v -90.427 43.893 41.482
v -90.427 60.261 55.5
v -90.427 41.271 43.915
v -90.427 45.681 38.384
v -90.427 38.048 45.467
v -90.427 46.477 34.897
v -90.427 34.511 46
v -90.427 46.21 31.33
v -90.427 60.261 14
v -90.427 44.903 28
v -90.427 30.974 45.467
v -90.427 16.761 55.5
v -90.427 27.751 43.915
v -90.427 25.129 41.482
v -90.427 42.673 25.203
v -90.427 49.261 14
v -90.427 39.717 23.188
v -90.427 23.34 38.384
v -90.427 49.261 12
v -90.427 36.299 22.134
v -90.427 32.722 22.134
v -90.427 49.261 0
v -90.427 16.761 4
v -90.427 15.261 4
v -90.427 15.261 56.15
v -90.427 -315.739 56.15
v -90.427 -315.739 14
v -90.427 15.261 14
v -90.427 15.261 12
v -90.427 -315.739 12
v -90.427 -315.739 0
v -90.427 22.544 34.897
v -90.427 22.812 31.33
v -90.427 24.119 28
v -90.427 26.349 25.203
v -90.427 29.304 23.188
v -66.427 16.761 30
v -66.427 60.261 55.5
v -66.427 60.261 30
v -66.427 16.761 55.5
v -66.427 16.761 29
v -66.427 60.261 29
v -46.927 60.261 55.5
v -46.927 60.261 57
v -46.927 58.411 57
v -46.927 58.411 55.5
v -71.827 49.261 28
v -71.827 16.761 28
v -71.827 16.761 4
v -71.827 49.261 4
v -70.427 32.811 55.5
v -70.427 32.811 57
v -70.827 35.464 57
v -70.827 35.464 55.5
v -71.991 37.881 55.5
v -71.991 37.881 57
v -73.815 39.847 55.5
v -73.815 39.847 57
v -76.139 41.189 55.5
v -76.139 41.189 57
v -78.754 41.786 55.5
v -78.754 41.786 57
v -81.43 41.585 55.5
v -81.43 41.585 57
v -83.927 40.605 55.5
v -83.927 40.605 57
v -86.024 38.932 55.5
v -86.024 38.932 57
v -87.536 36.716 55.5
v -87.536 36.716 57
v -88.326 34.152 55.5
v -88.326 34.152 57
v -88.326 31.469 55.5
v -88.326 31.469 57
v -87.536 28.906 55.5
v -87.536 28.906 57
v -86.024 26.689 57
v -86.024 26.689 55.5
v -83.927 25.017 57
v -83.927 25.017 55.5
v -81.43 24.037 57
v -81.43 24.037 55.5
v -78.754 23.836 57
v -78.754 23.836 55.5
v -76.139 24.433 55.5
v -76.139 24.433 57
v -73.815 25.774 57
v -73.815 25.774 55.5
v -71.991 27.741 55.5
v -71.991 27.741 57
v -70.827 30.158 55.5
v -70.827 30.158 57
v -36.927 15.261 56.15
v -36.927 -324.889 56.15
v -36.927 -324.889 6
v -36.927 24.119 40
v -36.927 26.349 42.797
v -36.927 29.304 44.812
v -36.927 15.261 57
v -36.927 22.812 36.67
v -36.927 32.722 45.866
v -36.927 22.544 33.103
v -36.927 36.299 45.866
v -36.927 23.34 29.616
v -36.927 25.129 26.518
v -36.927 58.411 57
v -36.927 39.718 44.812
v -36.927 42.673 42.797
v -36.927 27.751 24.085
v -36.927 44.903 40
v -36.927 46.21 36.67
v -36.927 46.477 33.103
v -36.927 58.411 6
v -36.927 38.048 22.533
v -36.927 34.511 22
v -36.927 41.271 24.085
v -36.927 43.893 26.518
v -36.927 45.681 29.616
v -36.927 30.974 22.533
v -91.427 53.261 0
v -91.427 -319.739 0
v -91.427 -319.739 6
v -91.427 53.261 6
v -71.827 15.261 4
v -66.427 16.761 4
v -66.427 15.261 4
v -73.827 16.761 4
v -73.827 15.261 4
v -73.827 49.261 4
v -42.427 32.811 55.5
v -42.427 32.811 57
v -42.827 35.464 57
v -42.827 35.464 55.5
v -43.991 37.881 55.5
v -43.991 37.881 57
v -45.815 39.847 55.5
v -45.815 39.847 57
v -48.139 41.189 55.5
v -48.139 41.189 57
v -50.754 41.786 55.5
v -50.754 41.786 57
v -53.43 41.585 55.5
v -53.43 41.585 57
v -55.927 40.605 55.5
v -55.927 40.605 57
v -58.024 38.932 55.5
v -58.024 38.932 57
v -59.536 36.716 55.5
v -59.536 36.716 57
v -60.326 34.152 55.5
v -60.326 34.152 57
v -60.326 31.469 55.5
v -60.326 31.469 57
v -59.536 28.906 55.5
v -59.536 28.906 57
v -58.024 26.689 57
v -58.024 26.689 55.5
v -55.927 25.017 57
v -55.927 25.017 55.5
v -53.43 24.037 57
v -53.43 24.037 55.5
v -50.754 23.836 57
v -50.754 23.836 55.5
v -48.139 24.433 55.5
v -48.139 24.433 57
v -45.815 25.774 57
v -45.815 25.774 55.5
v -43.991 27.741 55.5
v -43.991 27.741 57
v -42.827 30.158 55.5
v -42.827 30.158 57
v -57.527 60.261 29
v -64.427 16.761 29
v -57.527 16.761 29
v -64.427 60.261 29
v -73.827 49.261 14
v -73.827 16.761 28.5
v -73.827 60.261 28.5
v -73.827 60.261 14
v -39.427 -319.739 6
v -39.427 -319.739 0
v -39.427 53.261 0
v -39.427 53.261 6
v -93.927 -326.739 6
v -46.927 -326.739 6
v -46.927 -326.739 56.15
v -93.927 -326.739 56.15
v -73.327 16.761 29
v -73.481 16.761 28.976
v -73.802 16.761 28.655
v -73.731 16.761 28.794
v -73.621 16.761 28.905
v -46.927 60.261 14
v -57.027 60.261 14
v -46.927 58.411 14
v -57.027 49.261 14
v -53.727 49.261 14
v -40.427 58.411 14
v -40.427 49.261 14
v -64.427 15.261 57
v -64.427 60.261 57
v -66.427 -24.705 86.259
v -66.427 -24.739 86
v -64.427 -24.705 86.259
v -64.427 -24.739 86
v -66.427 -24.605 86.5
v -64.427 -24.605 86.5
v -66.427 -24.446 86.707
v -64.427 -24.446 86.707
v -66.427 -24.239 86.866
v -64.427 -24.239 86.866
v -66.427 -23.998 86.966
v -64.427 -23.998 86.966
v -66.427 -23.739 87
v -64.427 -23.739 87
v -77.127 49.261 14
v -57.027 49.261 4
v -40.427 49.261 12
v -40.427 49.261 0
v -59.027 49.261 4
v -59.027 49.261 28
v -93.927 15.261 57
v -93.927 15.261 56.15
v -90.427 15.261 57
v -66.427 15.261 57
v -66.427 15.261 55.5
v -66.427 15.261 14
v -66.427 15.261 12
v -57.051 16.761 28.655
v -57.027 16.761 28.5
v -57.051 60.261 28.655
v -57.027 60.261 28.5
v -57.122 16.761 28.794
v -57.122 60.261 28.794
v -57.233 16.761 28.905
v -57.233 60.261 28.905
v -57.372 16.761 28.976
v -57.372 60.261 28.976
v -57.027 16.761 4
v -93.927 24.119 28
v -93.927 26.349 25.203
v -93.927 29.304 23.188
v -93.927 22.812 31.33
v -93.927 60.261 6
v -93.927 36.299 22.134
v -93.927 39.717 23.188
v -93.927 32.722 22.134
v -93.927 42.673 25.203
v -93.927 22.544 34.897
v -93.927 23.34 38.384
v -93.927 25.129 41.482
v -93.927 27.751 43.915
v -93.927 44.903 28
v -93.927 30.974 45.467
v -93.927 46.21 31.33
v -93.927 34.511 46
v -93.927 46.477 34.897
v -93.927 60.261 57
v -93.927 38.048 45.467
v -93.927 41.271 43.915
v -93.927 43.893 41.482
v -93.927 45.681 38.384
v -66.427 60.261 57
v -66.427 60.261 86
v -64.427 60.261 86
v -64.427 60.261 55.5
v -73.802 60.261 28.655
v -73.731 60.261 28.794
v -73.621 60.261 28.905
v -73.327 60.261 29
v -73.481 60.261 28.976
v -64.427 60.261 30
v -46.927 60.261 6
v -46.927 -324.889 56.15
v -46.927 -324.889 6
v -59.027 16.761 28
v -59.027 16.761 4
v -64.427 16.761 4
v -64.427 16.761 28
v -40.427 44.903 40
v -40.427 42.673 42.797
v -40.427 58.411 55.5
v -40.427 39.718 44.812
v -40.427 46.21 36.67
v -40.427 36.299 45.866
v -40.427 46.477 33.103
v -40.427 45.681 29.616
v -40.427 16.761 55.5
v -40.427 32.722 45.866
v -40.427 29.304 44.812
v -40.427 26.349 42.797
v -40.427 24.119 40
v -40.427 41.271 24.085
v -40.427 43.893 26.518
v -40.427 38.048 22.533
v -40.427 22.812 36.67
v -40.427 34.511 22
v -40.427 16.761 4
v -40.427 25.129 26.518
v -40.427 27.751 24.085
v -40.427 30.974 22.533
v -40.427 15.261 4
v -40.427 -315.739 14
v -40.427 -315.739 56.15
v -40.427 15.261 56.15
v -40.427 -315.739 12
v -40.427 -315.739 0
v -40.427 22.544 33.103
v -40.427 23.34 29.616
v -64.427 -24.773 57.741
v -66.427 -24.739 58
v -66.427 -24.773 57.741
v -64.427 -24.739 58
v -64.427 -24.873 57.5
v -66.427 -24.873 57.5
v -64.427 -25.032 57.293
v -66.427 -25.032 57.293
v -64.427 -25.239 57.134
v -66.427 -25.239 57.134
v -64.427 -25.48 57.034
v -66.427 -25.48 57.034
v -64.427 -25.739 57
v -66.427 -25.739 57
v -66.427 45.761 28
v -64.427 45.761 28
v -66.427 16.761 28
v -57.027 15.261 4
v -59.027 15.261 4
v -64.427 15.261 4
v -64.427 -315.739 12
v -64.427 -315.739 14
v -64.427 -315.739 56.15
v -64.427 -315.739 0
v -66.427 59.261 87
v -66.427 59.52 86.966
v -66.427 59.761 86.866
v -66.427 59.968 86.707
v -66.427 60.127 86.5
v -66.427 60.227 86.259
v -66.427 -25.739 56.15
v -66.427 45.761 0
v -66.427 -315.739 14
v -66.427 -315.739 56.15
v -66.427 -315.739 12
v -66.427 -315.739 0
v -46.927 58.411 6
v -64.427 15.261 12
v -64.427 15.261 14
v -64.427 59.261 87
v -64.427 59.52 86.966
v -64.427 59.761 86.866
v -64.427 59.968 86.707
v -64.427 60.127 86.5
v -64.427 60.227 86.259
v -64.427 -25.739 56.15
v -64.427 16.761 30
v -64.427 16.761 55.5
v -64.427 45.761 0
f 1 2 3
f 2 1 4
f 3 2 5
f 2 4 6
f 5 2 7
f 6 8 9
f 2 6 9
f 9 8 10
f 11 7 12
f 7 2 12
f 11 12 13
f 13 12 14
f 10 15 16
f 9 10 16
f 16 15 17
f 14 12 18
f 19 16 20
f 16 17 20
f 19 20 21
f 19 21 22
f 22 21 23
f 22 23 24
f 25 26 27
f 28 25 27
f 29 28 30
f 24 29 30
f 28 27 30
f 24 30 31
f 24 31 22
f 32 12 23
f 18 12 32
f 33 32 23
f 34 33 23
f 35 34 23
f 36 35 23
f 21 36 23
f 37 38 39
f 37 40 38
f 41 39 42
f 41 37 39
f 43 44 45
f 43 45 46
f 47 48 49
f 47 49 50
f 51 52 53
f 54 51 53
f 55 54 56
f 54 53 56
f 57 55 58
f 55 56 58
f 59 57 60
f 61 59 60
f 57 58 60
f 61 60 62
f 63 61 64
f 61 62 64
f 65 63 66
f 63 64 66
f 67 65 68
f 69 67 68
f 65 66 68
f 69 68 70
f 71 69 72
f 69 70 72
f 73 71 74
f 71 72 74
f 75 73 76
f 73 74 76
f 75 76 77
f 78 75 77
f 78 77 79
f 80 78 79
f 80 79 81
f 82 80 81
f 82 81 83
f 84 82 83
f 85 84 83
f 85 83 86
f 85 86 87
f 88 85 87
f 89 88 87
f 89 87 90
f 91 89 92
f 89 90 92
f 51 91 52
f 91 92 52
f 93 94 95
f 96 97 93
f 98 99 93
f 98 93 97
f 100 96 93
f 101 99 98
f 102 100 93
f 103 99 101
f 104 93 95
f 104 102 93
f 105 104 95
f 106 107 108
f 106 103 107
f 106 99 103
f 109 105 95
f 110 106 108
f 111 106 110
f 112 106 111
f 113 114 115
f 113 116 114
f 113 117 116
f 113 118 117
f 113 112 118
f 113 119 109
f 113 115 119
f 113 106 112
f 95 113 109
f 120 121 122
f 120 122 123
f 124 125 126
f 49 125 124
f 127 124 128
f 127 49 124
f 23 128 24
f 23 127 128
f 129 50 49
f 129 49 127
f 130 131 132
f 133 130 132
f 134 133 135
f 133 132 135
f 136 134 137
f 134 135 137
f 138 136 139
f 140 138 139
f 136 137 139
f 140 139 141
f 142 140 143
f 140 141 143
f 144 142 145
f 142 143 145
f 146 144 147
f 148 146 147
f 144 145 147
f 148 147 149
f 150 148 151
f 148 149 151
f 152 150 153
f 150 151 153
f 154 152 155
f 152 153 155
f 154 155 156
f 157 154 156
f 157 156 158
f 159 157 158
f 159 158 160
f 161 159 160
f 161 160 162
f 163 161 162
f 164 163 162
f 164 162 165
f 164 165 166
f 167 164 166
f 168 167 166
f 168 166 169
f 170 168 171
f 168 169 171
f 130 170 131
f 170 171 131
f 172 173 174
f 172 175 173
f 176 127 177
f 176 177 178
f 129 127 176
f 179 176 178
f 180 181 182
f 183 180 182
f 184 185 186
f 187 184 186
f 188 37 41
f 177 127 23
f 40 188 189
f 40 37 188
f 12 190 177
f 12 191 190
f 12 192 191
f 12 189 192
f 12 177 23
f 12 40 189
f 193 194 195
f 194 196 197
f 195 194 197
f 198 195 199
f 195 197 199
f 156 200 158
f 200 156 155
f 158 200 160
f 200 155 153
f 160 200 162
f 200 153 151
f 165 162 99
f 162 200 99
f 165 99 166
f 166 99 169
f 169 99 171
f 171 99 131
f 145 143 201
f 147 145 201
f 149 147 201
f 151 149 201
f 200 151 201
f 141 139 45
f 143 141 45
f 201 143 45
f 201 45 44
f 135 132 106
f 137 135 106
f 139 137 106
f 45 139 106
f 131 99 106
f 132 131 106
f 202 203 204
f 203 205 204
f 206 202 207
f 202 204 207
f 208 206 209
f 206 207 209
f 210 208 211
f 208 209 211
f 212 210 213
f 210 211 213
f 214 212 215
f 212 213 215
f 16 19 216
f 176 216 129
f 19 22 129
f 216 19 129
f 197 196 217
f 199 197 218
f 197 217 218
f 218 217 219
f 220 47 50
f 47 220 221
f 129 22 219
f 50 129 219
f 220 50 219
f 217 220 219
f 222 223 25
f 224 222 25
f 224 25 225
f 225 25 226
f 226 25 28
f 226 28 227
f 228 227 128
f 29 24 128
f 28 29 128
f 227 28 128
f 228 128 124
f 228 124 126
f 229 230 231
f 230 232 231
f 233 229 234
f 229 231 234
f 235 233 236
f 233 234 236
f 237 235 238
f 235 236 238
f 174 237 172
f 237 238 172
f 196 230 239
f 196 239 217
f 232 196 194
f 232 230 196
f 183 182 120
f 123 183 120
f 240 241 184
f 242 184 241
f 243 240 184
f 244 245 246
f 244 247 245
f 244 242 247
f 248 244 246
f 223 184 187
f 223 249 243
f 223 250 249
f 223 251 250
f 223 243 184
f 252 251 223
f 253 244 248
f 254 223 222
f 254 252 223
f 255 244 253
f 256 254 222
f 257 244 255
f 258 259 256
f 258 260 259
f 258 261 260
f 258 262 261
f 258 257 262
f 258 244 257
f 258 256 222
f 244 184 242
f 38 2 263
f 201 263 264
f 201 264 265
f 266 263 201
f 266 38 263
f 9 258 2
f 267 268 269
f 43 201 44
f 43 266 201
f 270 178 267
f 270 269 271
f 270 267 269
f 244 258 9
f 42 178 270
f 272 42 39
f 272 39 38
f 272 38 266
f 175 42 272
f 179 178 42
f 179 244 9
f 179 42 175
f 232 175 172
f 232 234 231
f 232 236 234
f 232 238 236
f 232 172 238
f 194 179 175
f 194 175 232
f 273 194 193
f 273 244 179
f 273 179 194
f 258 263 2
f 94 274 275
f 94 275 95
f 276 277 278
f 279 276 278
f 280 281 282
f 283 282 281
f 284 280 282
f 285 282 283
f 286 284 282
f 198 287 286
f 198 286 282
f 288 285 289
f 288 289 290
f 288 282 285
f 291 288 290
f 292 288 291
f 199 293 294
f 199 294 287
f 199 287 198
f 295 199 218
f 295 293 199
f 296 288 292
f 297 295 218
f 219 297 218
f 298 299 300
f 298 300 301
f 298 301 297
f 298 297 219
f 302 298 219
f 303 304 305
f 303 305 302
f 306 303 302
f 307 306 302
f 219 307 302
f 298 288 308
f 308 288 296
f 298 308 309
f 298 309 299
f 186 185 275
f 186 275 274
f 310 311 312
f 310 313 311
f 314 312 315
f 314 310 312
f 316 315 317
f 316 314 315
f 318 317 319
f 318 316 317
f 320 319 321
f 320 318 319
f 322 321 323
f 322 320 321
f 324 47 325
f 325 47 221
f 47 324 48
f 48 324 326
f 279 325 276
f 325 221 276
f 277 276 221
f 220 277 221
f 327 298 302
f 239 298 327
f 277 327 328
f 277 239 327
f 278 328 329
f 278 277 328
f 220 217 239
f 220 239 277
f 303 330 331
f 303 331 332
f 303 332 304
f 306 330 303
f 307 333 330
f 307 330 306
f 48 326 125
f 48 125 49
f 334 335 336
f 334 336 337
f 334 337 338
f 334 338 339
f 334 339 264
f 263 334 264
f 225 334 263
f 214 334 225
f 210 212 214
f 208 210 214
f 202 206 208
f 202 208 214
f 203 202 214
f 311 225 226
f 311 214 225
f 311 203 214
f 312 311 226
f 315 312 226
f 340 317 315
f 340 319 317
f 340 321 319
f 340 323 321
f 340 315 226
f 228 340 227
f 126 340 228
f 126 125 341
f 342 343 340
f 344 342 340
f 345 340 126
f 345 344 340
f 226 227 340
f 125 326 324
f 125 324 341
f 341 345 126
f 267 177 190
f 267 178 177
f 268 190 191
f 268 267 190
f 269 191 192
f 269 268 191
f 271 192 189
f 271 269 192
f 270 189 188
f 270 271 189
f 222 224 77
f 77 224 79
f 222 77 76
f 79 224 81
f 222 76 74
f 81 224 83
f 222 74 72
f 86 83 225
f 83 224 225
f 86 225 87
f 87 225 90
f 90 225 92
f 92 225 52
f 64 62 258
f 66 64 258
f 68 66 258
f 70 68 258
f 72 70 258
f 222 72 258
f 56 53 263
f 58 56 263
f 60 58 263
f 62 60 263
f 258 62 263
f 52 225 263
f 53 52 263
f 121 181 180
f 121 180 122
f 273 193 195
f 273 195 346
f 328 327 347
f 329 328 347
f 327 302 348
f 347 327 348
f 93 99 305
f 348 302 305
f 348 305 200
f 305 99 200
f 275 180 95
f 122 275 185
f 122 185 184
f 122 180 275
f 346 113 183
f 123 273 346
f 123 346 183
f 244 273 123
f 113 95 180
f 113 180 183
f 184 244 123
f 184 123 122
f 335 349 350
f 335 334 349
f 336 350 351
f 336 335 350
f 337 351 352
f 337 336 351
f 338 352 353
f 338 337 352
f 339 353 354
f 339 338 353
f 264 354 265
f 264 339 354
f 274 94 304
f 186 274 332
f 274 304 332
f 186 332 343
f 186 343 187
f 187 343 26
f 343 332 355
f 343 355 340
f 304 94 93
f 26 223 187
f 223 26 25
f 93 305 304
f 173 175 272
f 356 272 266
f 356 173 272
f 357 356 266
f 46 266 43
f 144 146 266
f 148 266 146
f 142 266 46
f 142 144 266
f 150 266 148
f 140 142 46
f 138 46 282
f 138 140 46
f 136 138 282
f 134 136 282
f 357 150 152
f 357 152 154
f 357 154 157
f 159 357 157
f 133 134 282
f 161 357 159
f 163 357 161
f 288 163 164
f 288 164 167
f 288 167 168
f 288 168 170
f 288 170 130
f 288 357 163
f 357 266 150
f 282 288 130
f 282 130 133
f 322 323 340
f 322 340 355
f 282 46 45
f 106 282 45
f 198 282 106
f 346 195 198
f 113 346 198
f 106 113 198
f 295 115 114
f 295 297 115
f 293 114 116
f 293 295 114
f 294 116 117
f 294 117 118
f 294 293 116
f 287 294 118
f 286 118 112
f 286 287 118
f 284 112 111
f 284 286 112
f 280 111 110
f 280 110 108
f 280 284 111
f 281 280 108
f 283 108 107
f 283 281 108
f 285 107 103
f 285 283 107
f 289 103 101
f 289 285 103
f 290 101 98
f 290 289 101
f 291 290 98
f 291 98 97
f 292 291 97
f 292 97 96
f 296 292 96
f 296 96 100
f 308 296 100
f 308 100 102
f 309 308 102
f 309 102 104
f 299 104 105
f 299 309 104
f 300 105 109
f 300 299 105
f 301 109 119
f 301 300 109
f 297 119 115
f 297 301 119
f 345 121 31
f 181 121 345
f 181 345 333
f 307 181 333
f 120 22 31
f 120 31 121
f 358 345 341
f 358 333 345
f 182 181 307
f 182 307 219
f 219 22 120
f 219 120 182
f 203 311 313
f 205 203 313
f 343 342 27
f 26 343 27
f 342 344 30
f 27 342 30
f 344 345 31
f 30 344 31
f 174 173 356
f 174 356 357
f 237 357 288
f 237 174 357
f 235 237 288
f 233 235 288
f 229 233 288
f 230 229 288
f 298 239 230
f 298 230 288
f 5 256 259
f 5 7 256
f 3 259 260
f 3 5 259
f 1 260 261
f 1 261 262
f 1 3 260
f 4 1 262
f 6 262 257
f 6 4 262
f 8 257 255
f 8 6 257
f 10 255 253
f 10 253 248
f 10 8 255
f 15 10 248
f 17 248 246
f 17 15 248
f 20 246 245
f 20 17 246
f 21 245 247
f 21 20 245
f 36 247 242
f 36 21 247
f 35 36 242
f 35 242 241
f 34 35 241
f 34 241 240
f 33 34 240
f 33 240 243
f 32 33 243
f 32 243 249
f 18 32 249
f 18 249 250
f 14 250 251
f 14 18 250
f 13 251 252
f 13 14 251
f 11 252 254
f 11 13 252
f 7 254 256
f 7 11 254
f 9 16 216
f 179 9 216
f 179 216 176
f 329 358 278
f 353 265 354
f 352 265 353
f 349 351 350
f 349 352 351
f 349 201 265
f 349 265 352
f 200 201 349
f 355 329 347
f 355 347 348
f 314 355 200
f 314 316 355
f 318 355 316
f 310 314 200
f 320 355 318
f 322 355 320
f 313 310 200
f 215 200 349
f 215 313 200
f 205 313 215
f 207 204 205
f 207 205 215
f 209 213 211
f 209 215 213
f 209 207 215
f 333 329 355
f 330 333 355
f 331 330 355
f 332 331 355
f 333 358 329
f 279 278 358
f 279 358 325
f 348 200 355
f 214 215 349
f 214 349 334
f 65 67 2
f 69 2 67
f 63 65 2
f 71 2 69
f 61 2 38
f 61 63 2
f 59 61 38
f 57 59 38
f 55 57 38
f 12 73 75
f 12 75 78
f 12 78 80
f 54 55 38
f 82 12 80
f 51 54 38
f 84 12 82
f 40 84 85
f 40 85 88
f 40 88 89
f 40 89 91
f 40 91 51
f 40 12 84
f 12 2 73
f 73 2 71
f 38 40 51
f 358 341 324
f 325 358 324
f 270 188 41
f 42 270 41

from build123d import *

# Parameters (mm, degrees)
SZKIC1_W                     = 53
SZKIC1_H                     = 374
SZKIC1_W_2                   = 24
SZKIC1_H_2                   = 365
DODANIE_WYCI_GNI_CIE2_DEPTH  = 12
SZKIC2_W                     = 12
SZKIC2_H                     = 3.5
WYTNIJ_WYCI_GNI_CIE1_DEPTH   = 2
SZKIC3_W                     = 53
SZKIC3_H                     = 374
DODANIE_WYCI_GNI_CIE3_DEPTH  = 2
SZKIC4_W                     = 13.3
SZKIC4_H                     = 30.500081729
SZKIC4_W_2                   = 9.4
SZKIC4_H_2                   = 64.96
WYTNIJ_WYCI_GNI_CIE2_DEPTH   = 2
SZKIC5_W                     = 2
SZKIC5_H                     = 374
DODANIE_WYCI_GNI_CIE4_DEPTH  = 43
DODANIE_WYCI_GNI_CIE5_DEPTH  = 41.5
SZKIC7_W                     = 25.5
SZKIC7_H                     = 38.500081729
DODANIE_WYCI_GNI_CIE6_DEPTH  = 1.5
SZKIC9_R                     = 12
WYTNIJ_WYCI_GNI_CIE4_DEPTH   = 1.5
DODANIE_WYCI_GNI_CIE7_DEPTH  = 43
DODANIE_WYCI_GNI_CIE8_DEPTH  = 43
SZKIC12_R                    = 12
WYTNIJ_WYCI_GNI_CIE5_DEPTH   = 1.5
SZKIC13_R                    = 9
WYTNIJ_WYCI_GNI_CIE6_DEPTH   = 1.5
SZKIC14_W                    = 57
SZKIC14_H                    = 374
SZKIC14_R                    = 12
DODANIE_WYCI_GNI_CIE9_DEPTH  = 1
SZKIC15_W                    = 57
SZKIC15_H                    = 374
SZKIC15_R                    = 12
DODANIE_WYCI_GNI_CIE10_DEPTH = 1
SZKIC16_W                    = 55
SZKIC16_H                    = 57
SZKIC16_W_2                  = 24
SZKIC16_H_2                  = 41.5
DODANIE_WYCI_GNI_CIE11_DEPTH = 1
SZKIC17_W                    = 55
SZKIC17_H                    = 57
DODANIE_WYCI_GNI_CIE12_DEPTH = 1
DODANIE_WYCI_GNI_CIE13_DEPTH = 30
SZKIC20_W                    = 55
SZKIC20_H                    = 57
DODANIE_WYCI_GNI_CIE14_DEPTH = 5.5
SZKIC21_W                    = 24
SZKIC21_H                    = 41.5
DODANIE_WYCI_GNI_CIE15_DEPTH = 5.5
SZKIC22_W                    = 57
SZKIC22_H                    = 387
SZKIC22_R                    = 12
DODANIE_WYCI_GNI_CIE16_DEPTH = 1
SZKIC23_W                    = 57
SZKIC23_H                    = 387
SZKIC23_R                    = 12
DODANIE_WYCI_GNI_CIE17_DEPTH = 1
ZAOKR_GLENIE1_R              = 1
ZAOKR_GLENIE2_R              = 1
ZAOKR_GLENIE3_R              = 1
SZKIC24_W                    = 57
SZKIC24_H                    = 387
SZKIC24_W_2                  = 52
SZKIC24_H_2                  = 373
WYTNIJ_WYCI_GNI_CIE7_DEPTH   = 6
SZKIC25_W                    = 24
SZKIC25_H                    = 330.999918271
WYTNIJ_WYCI_GNI_CIE8_DEPTH   = 2
SZKIC26_W                    = 10
SZKIC26_H                    = 51
WYTNIJ_WYCI_GNI_CIE9_DEPTH   = 1.85
SZKIC27_W                    = 10
SZKIC27_H                    = 51
WYTNIJ_WYCI_GNI_CIE10_DEPTH  = 1.85
WYTNIJ_WYCI_GNI_CIE11_DEPTH  = 0.85
WYTNIJ_WYCI_GNI_CIE12_DEPTH  = 2
WYTNIJ_WYCI_GNI_CIE13_DEPTH  = 2
SZKIC31_W                    = 2
SZKIC31_H                    = 3.5
WYTNIJ_WYCI_GNI_CIE14_DEPTH  = 16
DODANIE_WYCI_GNI_CIE18_DEPTH = 7.4
DODANIE_WYCI_GNI_CIE19_DEPTH = 7.4
SZKIC34_W                    = 7.4
SZKIC34_H                    = 11
DODANIE_WYCI_GNI_CIE20_DEPTH = 14
SZKIC35_W                    = 7.4
SZKIC35_H                    = 11
DODANIE_WYCI_GNI_CIE21_DEPTH = 14
SZKIC36_W                    = 2
SZKIC36_H                    = 34.000081729
DODANIE_WYCI_GNI_CIE22_DEPTH = 24
SZKIC37_W                    = 16.6
SZKIC37_H                    = 1.5
SZKIC37_W_2                  = 5.4
DODANIE_WYCI_GNI_CIE23_DEPTH = 8
SZKIC38_W                    = 7.4
SZKIC38_H                    = 43.500081729
WYTNIJ_WYCI_GNI_CIE15_DEPTH  = 1
ZAOKR_GLENIE4_R              = 0.5
ZAOKR_GLENIE5_R              = 0.5


with BuildPart() as part:
    # Szkic1 → Dodanie-wyciągnięcie2 (new body)
    with BuildSketch(Plane.XY):
        with Locations((-65.426891924, -133.239080048)):
            Rectangle(SZKIC1_W, SZKIC1_H)
        with Locations((-78.426891924, -133.239080048)):
            Rectangle(SZKIC1_W_2, SZKIC1_H_2, mode=Mode.SUBTRACT)
        with Locations((-52.426891924, -133.239080048)):
            Rectangle(SZKIC1_W_2, SZKIC1_H_2, mode=Mode.SUBTRACT)
    extrude(amount=DODANIE_WYCI_GNI_CIE2_DEPTH)

    # Szkic2 → Wytnij-wyciągnięcie1 (cut)
    with BuildSketch(Plane.ZY.offset(66.426891924)):
        with Locations((6, 47.510919952)):
            Rectangle(SZKIC2_W, SZKIC2_H)
    extrude(amount=-WYTNIJ_WYCI_GNI_CIE1_DEPTH, mode=Mode.SUBTRACT)

    # Szkic3 → Dodanie-wyciągnięcie3 (add)
    with BuildSketch(Plane.XY.offset(12)):
        with Locations((-65.426891924, -133.239080048)):
            Rectangle(SZKIC3_W, SZKIC3_H)
    extrude(amount=DODANIE_WYCI_GNI_CIE3_DEPTH)

    # Szkic4 → Wytnij-wyciągnięcie2 (cut)
    with BuildSketch(Plane.XY.offset(14)):
        Polygon((-46.926891924, -11.039080048), (-56.326891924, -11.039080048), (-56.326891924, -35.399080048), (-56.326891924, -40.479080048), (-46.926891924, -40.479080048), (-46.926891924, -35.399080048), align=None)
        with Locations((-47.076891924, 34.010879088)):
            Rectangle(SZKIC4_W, SZKIC4_H)
        with Locations((-83.776891924, 34.010879088)):
            Rectangle(SZKIC4_W, SZKIC4_H)
        Polygon((-74.526891924, -35.399080048), (-74.526891924, -11.039080048), (-83.926891924, -11.039080048), (-83.926891924, -35.399080048), (-83.926891924, -40.479080048), (-74.526891924, -40.479080048), align=None)
        with Locations((-51.626891924, -133.719080048)):
            Rectangle(SZKIC4_W_2, SZKIC4_H_2)
        with Locations((-79.226891924, -133.719080048)):
            Rectangle(SZKIC4_W_2, SZKIC4_H_2)
    extrude(amount=-WYTNIJ_WYCI_GNI_CIE2_DEPTH, mode=Mode.SUBTRACT)

    # Szkic5 → Dodanie-wyciągnięcie4 (add)
    with BuildSketch(Plane.XY.offset(14)):
        with Locations((-65.426891924, -133.239080048)):
            Rectangle(SZKIC5_W, SZKIC5_H)
    extrude(amount=DODANIE_WYCI_GNI_CIE4_DEPTH)

    # Szkic6 → Dodanie-wyciągnięcie5 (add)
    with BuildSketch(Plane.XY.offset(14)):
        Polygon((-64.426891924, 16.760838223), (-40.426891924, 16.760838223), (-40.426891924, 53.760919952), (-38.926891924, 53.760919952), (-38.926891924, 15.260838223), (-64.426891924, 15.260838223), align=None)
        Polygon((-90.426891924, 53.760919952), (-91.926891924, 53.760919952), (-91.926891924, 15.260838223), (-66.426891924, 15.260838223), (-66.426891924, 16.760838223), (-90.426891924, 16.760838223), align=None)
    extrude(amount=DODANIE_WYCI_GNI_CIE5_DEPTH)

    # Szkic7 → Dodanie-wyciągnięcie6 (add)
    with BuildSketch(Plane.XY.offset(55.5)):
        with Locations((-51.676891924, 34.510879088)):
            Rectangle(SZKIC7_W, SZKIC7_H)
        with Locations((-79.176891924, 34.510879088)):
            Rectangle(SZKIC7_W, SZKIC7_H)
    extrude(amount=DODANIE_WYCI_GNI_CIE6_DEPTH)

    # Szkic9 → Wytnij-wyciągnięcie4 (cut)
    with BuildSketch(Plane.ZY.offset(91.926891924)):
        with Locations((34, 34.510879088)):
            Circle(SZKIC9_R)
    extrude(amount=-WYTNIJ_WYCI_GNI_CIE4_DEPTH, mode=Mode.SUBTRACT)

    # Szkic10 → Dodanie-wyciągnięcie7 (add)
    with BuildSketch(Plane.XY.offset(14)):
        Polygon((-91.926891924, 15.260838223), (-91.926891924, -320.239080048), (-66.426891924, -320.239080048), (-66.426891924, -315.739080048), (-90.426891924, -315.739080048), (-90.426891924, 15.260838223), align=None)
    extrude(amount=DODANIE_WYCI_GNI_CIE7_DEPTH)

    # Szkic11 → Dodanie-wyciągnięcie8 (add)
    with BuildSketch(Plane.XY.offset(14)):
        Polygon((-38.926891924, 15.260838223), (-38.926891924, -320.239080048), (-64.426891924, -320.239080048), (-64.426891924, -315.739080048), (-40.426891924, -315.739080048), (-40.426891924, 15.260838223), align=None)
    extrude(amount=DODANIE_WYCI_GNI_CIE8_DEPTH)

    # Szkic12 → Wytnij-wyciągnięcie5 (cut)
    with BuildSketch(Plane(origin=(-38.926891924, 0, 0), x_dir=(0, 0, -1), z_dir=(1, 0, 0))):
        with Locations((-34, 34.510919952)):
            Circle(SZKIC12_R)
    extrude(amount=-WYTNIJ_WYCI_GNI_CIE5_DEPTH, mode=Mode.SUBTRACT)

    # Szkic13 → Wytnij-wyciągnięcie6 (cut)
    with BuildSketch(Plane.XY.offset(57)):
        with Locations((-51.426891924, 32.810879088)):
            Circle(SZKIC13_R)
        with Locations((-79.426891924, 32.810879088)):
            Circle(SZKIC13_R)
    extrude(amount=-WYTNIJ_WYCI_GNI_CIE6_DEPTH, mode=Mode.SUBTRACT)

    # Szkic14 → Dodanie-wyciągnięcie9 (add)
    with BuildSketch(Plane(origin=(-38.926891924, 0, 0), x_dir=(0, 0, -1), z_dir=(1, 0, 0))):
        with Locations((-28.5, -133.239080048)):
            Rectangle(SZKIC14_W, SZKIC14_H)
        with Locations((-34, 34.510919952)):
            Circle(SZKIC14_R, mode=Mode.SUBTRACT)
    extrude(amount=DODANIE_WYCI_GNI_CIE9_DEPTH)

    # Szkic15 → Dodanie-wyciągnięcie10 (add)
    with BuildSketch(Plane.ZY.offset(91.926891924)):
        with Locations((28.5, -133.239080048)):
            Rectangle(SZKIC15_W, SZKIC15_H)
        with Locations((34, 34.510879088)):
            Circle(SZKIC15_R, mode=Mode.SUBTRACT)
    extrude(amount=DODANIE_WYCI_GNI_CIE10_DEPTH)

    # Szkic16 → Dodanie-wyciągnięcie11 (add)
    with BuildSketch(Plane(origin=(0, 53.760919952, 0), x_dir=(1, 0, 0), z_dir=(0, 1, 0))):
        with Locations((-65.426891924, -28.5)):
            Rectangle(SZKIC16_W, SZKIC16_H)
        with Locations((-52.426891924, -34.75)):
            Rectangle(SZKIC16_W_2, SZKIC16_H_2, mode=Mode.SUBTRACT)
        with Locations((-78.426891924, -34.75)):
            Rectangle(SZKIC16_W_2, SZKIC16_H_2, mode=Mode.SUBTRACT)
    extrude(amount=DODANIE_WYCI_GNI_CIE11_DEPTH)

    # Szkic17 → Dodanie-wyciągnięcie12 (add)
    with BuildSketch(Plane.XZ.offset(320.239080048)):
        with Locations((-65.426891924, 28.5)):
            Rectangle(SZKIC17_W, SZKIC17_H)
    extrude(amount=DODANIE_WYCI_GNI_CIE12_DEPTH)

    # Szkic18 → Dodanie-wyciągnięcie13 (add)
    with BuildSketch(Plane.XY.offset(57)):
        Polygon((-64.426891924, 15.260838223), (-64.426891924, 54.760919952), (-66.426891924, 54.760919952), (-66.426891924, 15.260838223), (-66.426891924, -4.739161777), (-66.426891924, -24.739161777), (-64.426891924, -24.739161777), (-64.426891924, -4.739161777), align=None)
    extrude(amount=DODANIE_WYCI_GNI_CIE13_DEPTH)

    # Szkic20 → Dodanie-wyciągnięcie14 (add)
    with BuildSketch(Plane.XZ.offset(321.239080048)):
        with Locations((-65.426891924, 28.5)):
            Rectangle(SZKIC20_W, SZKIC20_H)
    extrude(amount=DODANIE_WYCI_GNI_CIE14_DEPTH)

    # Szkic21 → Dodanie-wyciągnięcie15 (add)
    with BuildSketch(Plane(origin=(0, 54.760919952, 0), x_dir=(1, 0, 0), z_dir=(0, 1, 0))):
        Polygon((-64.426891924, -87), (-66.426891924, -87), (-66.426891924, -57), (-92.926891924, -57), (-92.926891924, 0), (-37.926891924, 0), (-37.926891924, -57), (-64.426891924, -57), align=None)
        with Locations((-52.426891924, -34.75)):
            Rectangle(SZKIC21_W, SZKIC21_H, mode=Mode.SUBTRACT)
        with Locations((-78.426891924, -34.75)):
            Rectangle(SZKIC21_W, SZKIC21_H, mode=Mode.SUBTRACT)
    extrude(amount=DODANIE_WYCI_GNI_CIE15_DEPTH)

    # Szkic22 → Dodanie-wyciągnięcie16 (add)
    with BuildSketch(Plane(origin=(-37.926891924, 0, 0), x_dir=(0, 0, -1), z_dir=(1, 0, 0))):
        with Locations((-28.5, -133.239080048)):
            Rectangle(SZKIC22_W, SZKIC22_H)
        with Locations((-34, 34.510919952)):
            Circle(SZKIC22_R, mode=Mode.SUBTRACT)
    extrude(amount=DODANIE_WYCI_GNI_CIE16_DEPTH)

    # Szkic23 → Dodanie-wyciągnięcie17 (add)
    with BuildSketch(Plane.ZY.offset(92.926891924)):
        with Locations((28.5, -133.239080048)):
            Rectangle(SZKIC23_W, SZKIC23_H)
        with Locations((34, 34.510879088)):
            Circle(SZKIC23_R, mode=Mode.SUBTRACT)
    extrude(amount=DODANIE_WYCI_GNI_CIE17_DEPTH)

    # Zaokrąglenie1
    zaokr_glenie1_edges = [part.edges().sort_by_distance(p)[0] for p in [
        (-65.426891924, -24.739161777, 87),
    ]]
    fillet(zaokr_glenie1_edges, radius=ZAOKR_GLENIE1_R)

    # Zaokrąglenie2
    zaokr_glenie2_edges = [part.edges().sort_by_distance(p)[0] for p in [
        (-65.426891924, -24.739161777, 57),
    ]]
    fillet(zaokr_glenie2_edges, radius=ZAOKR_GLENIE2_R)

    # Zaokrąglenie3
    zaokr_glenie3_edges = [part.edges().sort_by_distance(p)[0] for p in [
        (-65.426891924, 60.260919952, 87),
    ]]
    fillet(zaokr_glenie3_edges, radius=ZAOKR_GLENIE3_R)

    # Szkic24 → Wytnij-wyciągnięcie7 (cut)
    with BuildSketch(Plane(origin=(0, 0, 0), x_dir=(-1, 0, 0), z_dir=(0, 0, -1))):
        with Locations((65.426891924, -133.239080048)):
            Rectangle(SZKIC24_W, SZKIC24_H)
        with Locations((65.426891924, -133.239080048)):
            Rectangle(SZKIC24_W_2, SZKIC24_H_2, mode=Mode.SUBTRACT)
    extrude(amount=-WYTNIJ_WYCI_GNI_CIE7_DEPTH, mode=Mode.SUBTRACT)

    # Szkic25 → Wytnij-wyciągnięcie8 (cut)
    with BuildSketch(Plane.XY.offset(14)):
        with Locations((-52.426891924, -150.239120912)):
            Rectangle(SZKIC25_W, SZKIC25_H)
        with Locations((-78.426891924, -150.239120912)):
            Rectangle(SZKIC25_W, SZKIC25_H)
    extrude(amount=-WYTNIJ_WYCI_GNI_CIE8_DEPTH, mode=Mode.SUBTRACT)

    # Szkic26 → Wytnij-wyciągnięcie9 (cut)
    with BuildSketch(Plane(origin=(0, 60.260919952, 0), x_dir=(1, 0, 0), z_dir=(0, 1, 0))):
        with Locations((-41.926891924, -31.5)):
            Rectangle(SZKIC26_W, SZKIC26_H)
    extrude(amount=-WYTNIJ_WYCI_GNI_CIE9_DEPTH, mode=Mode.SUBTRACT)

    # Szkic27 → Wytnij-wyciągnięcie10 (cut)
    with BuildSketch(Plane.XZ.offset(326.739080048)):
        with Locations((-41.926891924, 31.5)):
            Rectangle(SZKIC27_W, SZKIC27_H)
    extrude(amount=-WYTNIJ_WYCI_GNI_CIE10_DEPTH, mode=Mode.SUBTRACT)

    # Szkic28 → Wytnij-wyciągnięcie11 (cut)
    with BuildSketch(Plane.XY.offset(57)):
        Polygon((-36.926891924, -324.889080048), (-46.926891924, -324.889080048), (-46.926891924, -326.739080048), (-93.926891924, -326.739080048), (-93.926891924, 15.260838223), (-66.426891924, 15.260838223), (-66.426891924, -25.739161777), (-64.426891924, -25.739161777), (-64.426891924, 15.260838223), (-36.926891924, 15.260838223), align=None)
    extrude(amount=-WYTNIJ_WYCI_GNI_CIE11_DEPTH, mode=Mode.SUBTRACT)

    # Szkic29 → Wytnij-wyciągnięcie12 (cut)
    with BuildSketch(Plane.XY.offset(14)):
        Polygon((-40.426891924, 18.760838223), (-40.426891924, 16.760838223), (-64.426891924, 16.760838223), (-64.426891924, 49.260919952), (-53.726891924, 49.260919952), (-53.726891924, 18.760838223), align=None)
    extrude(amount=-WYTNIJ_WYCI_GNI_CIE12_DEPTH, mode=Mode.SUBTRACT)

    # Szkic30 → Wytnij-wyciągnięcie13 (cut)
    with BuildSketch(Plane.XY.offset(14)):
        Polygon((-77.126891924, 49.260919952), (-66.426891924, 49.260919952), (-66.426891924, 16.760838223), (-90.426891924, 16.760838223), (-90.426891924, 18.760838223), (-77.126891924, 18.760838223), align=None)
    extrude(amount=-WYTNIJ_WYCI_GNI_CIE13_DEPTH, mode=Mode.SUBTRACT)

    # Szkic31 → Wytnij-wyciągnięcie14 (cut)
    with BuildSketch(Plane(origin=(0, 0, 12), x_dir=(-1, 0, 0), z_dir=(0, 0, -1))):
        with Locations((65.426891924, 47.510919952)):
            Rectangle(SZKIC31_W, SZKIC31_H)
    extrude(amount=-WYTNIJ_WYCI_GNI_CIE14_DEPTH, mode=Mode.SUBTRACT)

    # Szkic32 → Dodanie-wyciągnięcie18 (add)
    with BuildSketch(Plane(origin=(-64.426891924, 0, 0), x_dir=(0, 0, -1), z_dir=(1, 0, 0))):
        Polygon((-28, 45.760919952), (-28, 16.760838223), (-30, 16.760838223), (-30, 60.260919952), (-28, 60.260919952), align=None)
    extrude(amount=DODANIE_WYCI_GNI_CIE18_DEPTH)

    # Szkic33 → Dodanie-wyciągnięcie19 (add)
    with BuildSketch(Plane.ZY.offset(66.426891924)):
        Polygon((28, 49.260919952), (28, 60.260919952), (30, 60.260919952), (30, 16.760838223), (28, 16.760838223), align=None)
    extrude(amount=DODANIE_WYCI_GNI_CIE19_DEPTH)

    # Szkic34 → Dodanie-wyciągnięcie20 (add)
    with BuildSketch(Plane.XY.offset(14)):
        with Locations((-60.726891924, 54.760919952)):
            Rectangle(SZKIC34_W, SZKIC34_H)
    extrude(amount=DODANIE_WYCI_GNI_CIE20_DEPTH)

    # Szkic35 → Dodanie-wyciągnięcie21 (add)
    with BuildSketch(Plane.XY.offset(14)):
        with Locations((-70.126891924, 54.760919952)):
            Rectangle(SZKIC35_W, SZKIC35_H)
    extrude(amount=DODANIE_WYCI_GNI_CIE21_DEPTH)

    # Szkic36 → Dodanie-wyciągnięcie22 (add)
    with BuildSketch(Plane(origin=(0, 0, 28), x_dir=(-1, 0, 0), z_dir=(0, 0, -1))):
        with Locations((58.026891924, 32.260879088)):
            Rectangle(SZKIC36_W, SZKIC36_H)
        with Locations((72.826891924, 32.260879088)):
            Rectangle(SZKIC36_W, SZKIC36_H)
    extrude(amount=DODANIE_WYCI_GNI_CIE22_DEPTH)

    # Szkic37 → Dodanie-wyciągnięcie23 (add)
    with BuildSketch(Plane(origin=(0, 0, 12), x_dir=(-1, 0, 0), z_dir=(0, 0, -1))):
        with Locations((48.726891924, 16.010838223)):
            Rectangle(SZKIC37_W, SZKIC37_H)
        with Locations((61.726891924, 16.010838223)):
            Rectangle(SZKIC37_W_2, SZKIC37_H)
        with Locations((69.126891924, 16.010838223)):
            Rectangle(SZKIC37_W_2, SZKIC37_H)
        with Locations((82.126891924, 16.010838223)):
            Rectangle(SZKIC37_W, SZKIC37_H)
    extrude(amount=DODANIE_WYCI_GNI_CIE23_DEPTH)

    # Szkic38 → Wytnij-wyciągnięcie15 (cut)
    with BuildSketch(Plane.XY.offset(30)):
        with Locations((-70.126891924, 38.510879088)):
            Rectangle(SZKIC38_W, SZKIC38_H)
        with Locations((-60.726891924, 38.510879088)):
            Rectangle(SZKIC38_W, SZKIC38_H)
    extrude(amount=-WYTNIJ_WYCI_GNI_CIE15_DEPTH, mode=Mode.SUBTRACT)

    # Zaokrąglenie4
    zaokr_glenie4_edges = [part.edges().sort_by_distance(p)[0] for p in [
        (-57.026891924, 38.510879088, 29),
    ]]
    fillet(zaokr_glenie4_edges, radius=ZAOKR_GLENIE4_R)

    # Zaokrąglenie5
    zaokr_glenie5_edges = [part.edges().sort_by_distance(p)[0] for p in [
        (-73.826891924, 38.510879088, 29),
    ]]
    fillet(zaokr_glenie5_edges, radius=ZAOKR_GLENIE5_R)


solid = part.part
